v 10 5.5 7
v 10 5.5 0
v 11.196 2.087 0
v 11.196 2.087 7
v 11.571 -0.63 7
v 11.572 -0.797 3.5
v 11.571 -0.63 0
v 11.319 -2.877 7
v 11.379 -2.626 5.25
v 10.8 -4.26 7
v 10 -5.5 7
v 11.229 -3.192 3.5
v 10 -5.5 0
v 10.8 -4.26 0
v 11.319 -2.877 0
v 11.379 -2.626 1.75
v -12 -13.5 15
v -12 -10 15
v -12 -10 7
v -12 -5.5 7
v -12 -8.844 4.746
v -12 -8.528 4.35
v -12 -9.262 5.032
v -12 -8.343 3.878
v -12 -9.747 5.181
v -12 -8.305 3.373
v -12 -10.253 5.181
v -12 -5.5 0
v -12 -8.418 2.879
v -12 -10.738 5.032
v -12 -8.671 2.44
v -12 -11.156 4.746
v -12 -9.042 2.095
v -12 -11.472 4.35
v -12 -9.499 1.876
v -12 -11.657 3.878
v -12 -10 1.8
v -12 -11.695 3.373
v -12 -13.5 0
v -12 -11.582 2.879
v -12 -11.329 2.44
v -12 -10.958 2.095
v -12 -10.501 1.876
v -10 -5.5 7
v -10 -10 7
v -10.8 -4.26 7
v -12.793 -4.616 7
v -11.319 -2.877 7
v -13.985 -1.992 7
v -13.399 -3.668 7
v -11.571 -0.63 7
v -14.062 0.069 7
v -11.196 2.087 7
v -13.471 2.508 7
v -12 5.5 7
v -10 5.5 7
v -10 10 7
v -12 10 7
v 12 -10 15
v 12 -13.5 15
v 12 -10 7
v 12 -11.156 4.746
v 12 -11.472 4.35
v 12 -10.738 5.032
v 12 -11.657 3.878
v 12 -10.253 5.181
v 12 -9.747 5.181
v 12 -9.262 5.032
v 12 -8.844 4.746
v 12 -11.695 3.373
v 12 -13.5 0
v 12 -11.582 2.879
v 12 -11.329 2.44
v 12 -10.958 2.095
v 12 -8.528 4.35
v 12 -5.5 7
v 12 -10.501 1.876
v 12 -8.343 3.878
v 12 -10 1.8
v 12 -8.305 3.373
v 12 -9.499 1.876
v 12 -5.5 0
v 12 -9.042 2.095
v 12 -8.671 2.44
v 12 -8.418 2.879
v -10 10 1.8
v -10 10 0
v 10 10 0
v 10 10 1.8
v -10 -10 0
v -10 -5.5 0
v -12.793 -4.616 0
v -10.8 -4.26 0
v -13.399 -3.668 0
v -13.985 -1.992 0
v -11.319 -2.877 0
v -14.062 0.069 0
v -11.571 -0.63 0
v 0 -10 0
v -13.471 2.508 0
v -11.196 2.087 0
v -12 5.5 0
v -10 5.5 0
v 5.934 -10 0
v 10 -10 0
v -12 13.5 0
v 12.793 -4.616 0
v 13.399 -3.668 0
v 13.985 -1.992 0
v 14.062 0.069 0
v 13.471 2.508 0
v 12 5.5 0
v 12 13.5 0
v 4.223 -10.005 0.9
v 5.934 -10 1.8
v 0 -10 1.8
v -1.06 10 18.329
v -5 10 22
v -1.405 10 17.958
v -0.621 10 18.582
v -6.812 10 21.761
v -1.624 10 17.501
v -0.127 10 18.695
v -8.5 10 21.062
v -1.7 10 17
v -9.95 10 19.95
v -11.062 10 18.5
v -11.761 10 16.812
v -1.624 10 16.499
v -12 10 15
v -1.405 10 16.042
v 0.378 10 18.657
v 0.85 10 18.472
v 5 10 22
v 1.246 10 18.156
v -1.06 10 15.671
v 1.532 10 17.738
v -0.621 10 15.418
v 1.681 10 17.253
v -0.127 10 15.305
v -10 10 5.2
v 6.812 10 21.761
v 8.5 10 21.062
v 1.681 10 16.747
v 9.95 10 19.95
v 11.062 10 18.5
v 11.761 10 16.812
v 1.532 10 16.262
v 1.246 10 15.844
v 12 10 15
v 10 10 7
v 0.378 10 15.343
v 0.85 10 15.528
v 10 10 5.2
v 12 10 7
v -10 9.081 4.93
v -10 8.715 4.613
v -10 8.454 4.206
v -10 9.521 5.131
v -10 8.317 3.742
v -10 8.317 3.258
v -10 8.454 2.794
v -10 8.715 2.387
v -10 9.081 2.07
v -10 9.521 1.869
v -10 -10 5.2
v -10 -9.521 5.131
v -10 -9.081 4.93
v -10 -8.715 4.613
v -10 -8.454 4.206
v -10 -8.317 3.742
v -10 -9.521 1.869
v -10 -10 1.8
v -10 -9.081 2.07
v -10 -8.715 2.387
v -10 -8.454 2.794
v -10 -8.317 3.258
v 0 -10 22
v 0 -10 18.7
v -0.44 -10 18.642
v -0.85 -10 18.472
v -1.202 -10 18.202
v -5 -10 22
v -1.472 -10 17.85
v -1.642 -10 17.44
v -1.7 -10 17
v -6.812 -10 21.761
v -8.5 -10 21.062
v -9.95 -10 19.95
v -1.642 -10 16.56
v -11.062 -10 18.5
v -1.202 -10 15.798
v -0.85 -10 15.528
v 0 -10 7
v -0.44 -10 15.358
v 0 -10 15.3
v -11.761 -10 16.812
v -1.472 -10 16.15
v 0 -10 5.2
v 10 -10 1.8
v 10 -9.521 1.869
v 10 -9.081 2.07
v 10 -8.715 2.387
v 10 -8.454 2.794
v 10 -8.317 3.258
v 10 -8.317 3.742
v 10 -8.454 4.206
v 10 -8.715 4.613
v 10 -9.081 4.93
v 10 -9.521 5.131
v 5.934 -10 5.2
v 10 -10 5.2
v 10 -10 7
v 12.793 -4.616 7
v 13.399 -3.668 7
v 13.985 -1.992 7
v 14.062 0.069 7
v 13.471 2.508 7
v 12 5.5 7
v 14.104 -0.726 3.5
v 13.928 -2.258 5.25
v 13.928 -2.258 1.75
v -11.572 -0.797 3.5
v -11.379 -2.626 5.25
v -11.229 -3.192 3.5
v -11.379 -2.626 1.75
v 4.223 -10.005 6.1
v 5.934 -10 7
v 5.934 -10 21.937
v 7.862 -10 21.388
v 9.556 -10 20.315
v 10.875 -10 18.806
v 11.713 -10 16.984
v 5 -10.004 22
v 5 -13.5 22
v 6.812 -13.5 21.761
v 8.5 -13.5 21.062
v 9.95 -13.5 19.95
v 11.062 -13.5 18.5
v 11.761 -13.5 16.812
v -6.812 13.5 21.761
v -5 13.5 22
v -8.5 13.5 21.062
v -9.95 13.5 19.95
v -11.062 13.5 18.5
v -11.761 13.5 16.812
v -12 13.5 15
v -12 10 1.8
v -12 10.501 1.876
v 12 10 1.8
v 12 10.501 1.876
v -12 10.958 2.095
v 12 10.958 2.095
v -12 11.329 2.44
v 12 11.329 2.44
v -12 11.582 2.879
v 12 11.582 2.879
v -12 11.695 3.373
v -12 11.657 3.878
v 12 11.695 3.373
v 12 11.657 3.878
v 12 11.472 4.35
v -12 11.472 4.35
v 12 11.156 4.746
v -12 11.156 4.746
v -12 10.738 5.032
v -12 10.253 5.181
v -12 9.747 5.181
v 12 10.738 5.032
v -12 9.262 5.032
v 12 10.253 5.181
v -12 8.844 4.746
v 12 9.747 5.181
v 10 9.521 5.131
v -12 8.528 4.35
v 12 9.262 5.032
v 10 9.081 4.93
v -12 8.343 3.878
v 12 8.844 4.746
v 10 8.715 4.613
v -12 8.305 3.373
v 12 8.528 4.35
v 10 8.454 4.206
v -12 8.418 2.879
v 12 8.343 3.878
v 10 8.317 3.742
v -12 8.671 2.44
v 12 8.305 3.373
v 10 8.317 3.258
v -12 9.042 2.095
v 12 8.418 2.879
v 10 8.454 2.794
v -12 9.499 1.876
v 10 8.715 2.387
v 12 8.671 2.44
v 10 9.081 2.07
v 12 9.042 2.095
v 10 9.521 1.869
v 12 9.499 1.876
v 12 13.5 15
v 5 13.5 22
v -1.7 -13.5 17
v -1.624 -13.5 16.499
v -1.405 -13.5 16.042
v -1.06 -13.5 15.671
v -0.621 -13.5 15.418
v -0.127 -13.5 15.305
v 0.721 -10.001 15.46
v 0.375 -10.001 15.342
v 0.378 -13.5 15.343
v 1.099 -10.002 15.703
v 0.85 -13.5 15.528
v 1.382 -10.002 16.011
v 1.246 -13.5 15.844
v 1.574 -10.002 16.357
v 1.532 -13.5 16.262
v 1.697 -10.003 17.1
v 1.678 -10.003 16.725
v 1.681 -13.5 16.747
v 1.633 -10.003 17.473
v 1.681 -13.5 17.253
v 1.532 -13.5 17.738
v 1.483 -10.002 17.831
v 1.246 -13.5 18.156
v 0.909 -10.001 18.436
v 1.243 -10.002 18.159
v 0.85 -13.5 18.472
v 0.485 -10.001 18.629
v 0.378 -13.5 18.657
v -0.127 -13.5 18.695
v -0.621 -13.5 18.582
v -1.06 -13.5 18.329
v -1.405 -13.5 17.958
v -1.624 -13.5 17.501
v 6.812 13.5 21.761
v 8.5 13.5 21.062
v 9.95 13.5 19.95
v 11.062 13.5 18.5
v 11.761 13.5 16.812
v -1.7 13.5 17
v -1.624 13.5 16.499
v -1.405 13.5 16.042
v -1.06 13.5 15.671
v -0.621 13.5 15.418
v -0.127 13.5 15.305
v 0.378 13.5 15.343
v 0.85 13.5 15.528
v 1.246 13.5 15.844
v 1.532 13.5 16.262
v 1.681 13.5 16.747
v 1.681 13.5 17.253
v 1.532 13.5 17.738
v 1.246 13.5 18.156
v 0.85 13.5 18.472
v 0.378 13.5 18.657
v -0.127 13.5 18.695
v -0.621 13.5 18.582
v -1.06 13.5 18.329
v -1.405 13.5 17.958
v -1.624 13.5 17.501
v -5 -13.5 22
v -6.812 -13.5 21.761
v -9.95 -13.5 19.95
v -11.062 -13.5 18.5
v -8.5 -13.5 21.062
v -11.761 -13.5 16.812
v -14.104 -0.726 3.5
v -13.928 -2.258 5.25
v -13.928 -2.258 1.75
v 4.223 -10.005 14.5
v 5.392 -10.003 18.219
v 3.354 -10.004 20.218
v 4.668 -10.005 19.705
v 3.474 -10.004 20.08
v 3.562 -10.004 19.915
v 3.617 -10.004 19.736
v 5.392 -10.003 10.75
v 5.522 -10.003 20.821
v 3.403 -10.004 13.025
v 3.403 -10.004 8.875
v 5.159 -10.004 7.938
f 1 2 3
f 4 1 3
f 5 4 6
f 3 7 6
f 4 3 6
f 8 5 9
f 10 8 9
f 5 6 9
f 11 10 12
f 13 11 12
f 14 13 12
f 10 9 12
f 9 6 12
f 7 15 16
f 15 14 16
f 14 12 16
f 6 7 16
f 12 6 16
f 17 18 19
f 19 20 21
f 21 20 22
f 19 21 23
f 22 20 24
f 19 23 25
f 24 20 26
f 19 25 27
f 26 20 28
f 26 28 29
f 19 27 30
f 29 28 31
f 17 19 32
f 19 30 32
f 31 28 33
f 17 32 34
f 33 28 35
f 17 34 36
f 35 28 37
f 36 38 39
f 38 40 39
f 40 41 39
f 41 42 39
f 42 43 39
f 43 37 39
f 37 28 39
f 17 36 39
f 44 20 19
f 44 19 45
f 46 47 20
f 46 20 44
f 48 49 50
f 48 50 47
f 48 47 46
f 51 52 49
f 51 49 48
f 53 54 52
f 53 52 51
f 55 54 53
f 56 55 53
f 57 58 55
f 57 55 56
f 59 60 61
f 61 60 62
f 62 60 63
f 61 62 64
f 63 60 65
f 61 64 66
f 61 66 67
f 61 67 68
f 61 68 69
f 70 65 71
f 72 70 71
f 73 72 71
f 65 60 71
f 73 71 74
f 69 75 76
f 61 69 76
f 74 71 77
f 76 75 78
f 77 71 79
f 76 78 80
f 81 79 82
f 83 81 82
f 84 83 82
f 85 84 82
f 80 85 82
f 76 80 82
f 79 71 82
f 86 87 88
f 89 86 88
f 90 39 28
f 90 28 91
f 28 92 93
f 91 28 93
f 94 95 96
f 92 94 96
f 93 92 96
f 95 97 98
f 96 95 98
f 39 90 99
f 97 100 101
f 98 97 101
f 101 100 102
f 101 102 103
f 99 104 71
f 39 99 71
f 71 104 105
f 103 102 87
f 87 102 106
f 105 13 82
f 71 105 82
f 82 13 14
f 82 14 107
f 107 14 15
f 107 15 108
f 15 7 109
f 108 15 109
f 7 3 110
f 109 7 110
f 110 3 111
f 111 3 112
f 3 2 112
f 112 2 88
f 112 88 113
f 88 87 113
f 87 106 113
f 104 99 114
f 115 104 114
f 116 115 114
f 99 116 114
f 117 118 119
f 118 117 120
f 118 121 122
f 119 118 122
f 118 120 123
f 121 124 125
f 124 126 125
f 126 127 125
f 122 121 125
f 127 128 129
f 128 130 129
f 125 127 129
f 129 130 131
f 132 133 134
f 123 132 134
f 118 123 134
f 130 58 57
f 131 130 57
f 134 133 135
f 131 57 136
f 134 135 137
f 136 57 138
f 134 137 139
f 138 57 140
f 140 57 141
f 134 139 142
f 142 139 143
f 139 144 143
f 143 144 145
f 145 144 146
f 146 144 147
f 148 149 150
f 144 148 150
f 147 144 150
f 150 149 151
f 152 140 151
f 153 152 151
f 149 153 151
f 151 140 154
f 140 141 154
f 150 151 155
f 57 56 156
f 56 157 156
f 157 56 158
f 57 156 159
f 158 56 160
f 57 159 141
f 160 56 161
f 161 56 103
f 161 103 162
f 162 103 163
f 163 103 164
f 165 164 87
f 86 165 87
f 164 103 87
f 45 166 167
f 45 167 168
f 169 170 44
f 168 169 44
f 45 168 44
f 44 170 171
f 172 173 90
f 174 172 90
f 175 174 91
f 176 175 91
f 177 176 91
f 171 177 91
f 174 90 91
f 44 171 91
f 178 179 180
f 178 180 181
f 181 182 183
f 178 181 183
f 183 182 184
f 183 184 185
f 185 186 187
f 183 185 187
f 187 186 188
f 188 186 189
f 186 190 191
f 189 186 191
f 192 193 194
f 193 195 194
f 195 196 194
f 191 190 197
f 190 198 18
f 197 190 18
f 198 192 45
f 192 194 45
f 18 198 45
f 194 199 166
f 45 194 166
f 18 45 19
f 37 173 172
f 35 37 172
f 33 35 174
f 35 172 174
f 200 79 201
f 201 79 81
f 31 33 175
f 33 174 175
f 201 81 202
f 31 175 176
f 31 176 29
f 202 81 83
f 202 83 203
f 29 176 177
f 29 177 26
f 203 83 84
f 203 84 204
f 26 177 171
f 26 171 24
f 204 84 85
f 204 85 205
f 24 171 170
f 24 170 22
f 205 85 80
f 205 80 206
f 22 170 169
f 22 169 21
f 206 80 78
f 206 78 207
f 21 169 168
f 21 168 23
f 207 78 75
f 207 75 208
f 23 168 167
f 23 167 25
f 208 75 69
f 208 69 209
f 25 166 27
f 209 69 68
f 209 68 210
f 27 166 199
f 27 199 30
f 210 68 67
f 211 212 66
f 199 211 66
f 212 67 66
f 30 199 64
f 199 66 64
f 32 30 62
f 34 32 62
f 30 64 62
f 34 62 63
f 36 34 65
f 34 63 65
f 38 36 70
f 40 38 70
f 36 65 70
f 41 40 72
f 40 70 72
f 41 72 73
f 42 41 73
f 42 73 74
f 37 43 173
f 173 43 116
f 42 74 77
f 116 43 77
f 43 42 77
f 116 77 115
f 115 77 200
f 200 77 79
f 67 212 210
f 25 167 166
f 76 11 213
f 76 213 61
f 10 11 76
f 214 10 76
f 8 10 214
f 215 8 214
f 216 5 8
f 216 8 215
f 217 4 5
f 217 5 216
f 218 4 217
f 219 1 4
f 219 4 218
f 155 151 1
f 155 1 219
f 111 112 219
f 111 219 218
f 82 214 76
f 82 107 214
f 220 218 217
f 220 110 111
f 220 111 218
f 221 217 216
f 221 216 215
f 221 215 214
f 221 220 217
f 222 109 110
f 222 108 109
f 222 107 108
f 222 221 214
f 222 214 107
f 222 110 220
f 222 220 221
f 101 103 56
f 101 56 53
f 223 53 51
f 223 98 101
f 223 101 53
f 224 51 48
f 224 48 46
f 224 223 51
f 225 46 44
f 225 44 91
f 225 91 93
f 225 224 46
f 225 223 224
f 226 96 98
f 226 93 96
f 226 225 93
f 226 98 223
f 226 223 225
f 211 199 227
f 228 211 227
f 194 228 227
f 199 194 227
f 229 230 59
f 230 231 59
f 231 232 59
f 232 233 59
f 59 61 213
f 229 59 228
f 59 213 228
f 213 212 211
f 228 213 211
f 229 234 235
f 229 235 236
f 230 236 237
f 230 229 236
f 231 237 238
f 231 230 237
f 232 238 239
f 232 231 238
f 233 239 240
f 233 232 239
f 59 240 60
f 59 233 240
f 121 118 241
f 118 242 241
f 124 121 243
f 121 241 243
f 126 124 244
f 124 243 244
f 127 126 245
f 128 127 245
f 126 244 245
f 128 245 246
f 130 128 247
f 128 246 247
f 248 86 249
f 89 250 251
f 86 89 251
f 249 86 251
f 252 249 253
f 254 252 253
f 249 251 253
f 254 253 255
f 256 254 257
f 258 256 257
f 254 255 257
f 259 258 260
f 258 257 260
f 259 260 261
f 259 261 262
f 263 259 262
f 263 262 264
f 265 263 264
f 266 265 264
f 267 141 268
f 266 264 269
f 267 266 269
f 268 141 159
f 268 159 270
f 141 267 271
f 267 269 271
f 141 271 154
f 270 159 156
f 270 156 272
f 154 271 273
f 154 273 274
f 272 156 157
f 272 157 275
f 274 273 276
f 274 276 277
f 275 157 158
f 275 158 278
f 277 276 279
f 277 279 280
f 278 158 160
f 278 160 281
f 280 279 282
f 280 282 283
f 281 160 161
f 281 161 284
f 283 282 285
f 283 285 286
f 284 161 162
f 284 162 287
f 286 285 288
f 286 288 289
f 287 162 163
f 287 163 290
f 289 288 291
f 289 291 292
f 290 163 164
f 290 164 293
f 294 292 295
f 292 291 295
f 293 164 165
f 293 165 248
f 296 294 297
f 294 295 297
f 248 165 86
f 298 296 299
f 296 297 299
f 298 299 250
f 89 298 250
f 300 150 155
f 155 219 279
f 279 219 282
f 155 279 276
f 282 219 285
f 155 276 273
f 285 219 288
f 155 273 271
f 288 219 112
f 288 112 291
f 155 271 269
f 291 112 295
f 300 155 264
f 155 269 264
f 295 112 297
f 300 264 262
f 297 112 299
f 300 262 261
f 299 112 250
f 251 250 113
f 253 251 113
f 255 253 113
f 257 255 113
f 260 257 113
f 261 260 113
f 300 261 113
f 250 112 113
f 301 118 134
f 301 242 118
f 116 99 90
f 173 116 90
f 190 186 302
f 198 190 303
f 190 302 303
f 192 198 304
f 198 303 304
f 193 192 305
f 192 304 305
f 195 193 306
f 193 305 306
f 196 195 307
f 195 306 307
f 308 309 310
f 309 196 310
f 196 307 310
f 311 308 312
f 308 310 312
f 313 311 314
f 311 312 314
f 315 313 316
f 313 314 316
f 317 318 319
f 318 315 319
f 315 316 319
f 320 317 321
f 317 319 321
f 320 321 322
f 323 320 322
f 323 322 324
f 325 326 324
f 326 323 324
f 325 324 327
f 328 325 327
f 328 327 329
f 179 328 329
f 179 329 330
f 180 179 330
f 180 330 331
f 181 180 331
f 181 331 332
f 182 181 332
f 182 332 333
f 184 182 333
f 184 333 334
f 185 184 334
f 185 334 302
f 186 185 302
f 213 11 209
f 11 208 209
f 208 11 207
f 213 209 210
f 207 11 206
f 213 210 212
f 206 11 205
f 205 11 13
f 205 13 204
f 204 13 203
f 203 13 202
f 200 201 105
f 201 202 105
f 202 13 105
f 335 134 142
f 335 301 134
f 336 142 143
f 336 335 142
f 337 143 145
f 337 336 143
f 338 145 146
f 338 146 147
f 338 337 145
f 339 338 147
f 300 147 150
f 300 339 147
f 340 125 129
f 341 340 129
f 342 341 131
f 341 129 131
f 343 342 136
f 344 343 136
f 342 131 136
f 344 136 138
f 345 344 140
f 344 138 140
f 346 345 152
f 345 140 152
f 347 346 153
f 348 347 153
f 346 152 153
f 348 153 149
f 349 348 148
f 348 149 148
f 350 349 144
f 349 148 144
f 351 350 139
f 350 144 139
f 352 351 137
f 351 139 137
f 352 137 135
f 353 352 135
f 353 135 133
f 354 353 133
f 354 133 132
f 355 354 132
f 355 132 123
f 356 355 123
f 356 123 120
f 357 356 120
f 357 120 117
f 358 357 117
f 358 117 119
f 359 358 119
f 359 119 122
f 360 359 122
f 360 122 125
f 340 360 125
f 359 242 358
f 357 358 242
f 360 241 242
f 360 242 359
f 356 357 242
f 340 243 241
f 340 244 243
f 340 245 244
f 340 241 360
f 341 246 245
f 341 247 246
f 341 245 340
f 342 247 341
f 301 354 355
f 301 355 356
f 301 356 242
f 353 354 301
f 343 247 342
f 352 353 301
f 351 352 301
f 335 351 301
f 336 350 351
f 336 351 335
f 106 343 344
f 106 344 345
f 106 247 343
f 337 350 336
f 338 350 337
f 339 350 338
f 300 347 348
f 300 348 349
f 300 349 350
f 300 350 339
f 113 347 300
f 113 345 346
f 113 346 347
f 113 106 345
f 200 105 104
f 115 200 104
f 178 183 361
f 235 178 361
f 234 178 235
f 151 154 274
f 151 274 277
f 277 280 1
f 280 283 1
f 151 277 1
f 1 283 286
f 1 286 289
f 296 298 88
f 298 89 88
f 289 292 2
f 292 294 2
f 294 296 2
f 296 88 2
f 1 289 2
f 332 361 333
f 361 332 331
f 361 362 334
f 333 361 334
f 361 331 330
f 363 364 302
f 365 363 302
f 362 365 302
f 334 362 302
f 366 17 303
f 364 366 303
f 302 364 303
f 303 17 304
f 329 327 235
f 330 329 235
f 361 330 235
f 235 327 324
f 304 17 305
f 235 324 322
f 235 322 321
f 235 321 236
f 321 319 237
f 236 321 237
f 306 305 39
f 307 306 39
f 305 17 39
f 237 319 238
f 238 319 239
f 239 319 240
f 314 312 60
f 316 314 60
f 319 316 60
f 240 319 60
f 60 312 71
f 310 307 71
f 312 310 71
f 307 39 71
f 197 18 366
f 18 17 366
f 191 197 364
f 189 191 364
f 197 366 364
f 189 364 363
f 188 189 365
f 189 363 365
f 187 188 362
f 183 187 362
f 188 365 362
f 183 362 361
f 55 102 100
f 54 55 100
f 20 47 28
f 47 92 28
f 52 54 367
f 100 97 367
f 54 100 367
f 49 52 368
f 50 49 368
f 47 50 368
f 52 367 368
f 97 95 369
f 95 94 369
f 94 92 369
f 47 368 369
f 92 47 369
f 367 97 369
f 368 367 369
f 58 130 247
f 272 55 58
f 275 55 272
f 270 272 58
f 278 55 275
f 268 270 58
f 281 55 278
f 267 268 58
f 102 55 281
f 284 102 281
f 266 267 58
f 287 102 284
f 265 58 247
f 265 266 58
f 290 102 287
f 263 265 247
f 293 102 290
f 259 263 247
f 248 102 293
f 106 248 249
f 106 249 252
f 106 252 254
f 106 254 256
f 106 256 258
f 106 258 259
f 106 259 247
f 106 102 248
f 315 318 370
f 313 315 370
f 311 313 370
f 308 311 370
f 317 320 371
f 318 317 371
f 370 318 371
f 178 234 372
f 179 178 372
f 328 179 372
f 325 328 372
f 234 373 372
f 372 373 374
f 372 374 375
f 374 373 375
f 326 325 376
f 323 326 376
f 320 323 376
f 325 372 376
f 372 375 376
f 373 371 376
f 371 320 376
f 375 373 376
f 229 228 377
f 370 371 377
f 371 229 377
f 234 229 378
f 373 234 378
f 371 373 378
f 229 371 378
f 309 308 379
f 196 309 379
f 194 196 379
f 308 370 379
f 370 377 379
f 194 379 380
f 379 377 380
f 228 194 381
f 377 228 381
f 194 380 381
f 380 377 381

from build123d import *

# Parameters (mm, degrees)
SKETCH1_W               = 24
SKETCH1_H               = 3.5
BOSS_EXTRUDE1_DEPTH     = 7
BOSS_EXTRUDE2_START     = 7
BOSS_EXTRUDE2_OUTLINE_W = 24
BOSS_EXTRUDE2_OUTLINE_H = 3.5
BOSS_EXTRUDE2_DEPTH     = 15
FILLET1_R               = 7
M3_CLEARANCE_HOLE1_D    = 3.4
M3_CLEARANCE_HOLE2_D    = 3.4


# Read off the part's stored shape, not the designer's step: Boss-Extrude2
with BuildPart() as part:
    # Sketch1 → Boss-Extrude1 (new body)
    with BuildSketch(Plane.XY):
        with Locations((0, 11.75)):
            Rectangle(SKETCH1_W, SKETCH1_H)
        with BuildLine():
            Line((-10, 10), (-12, 10))
            Line((-12, 10), (-12, 5.5))
            add(Edge.make_bspline(
                [(-12, 5.5), (-16.208168435, -1.452739177), (-12, -5.5)],
                knots=[0, 0, 0, 0.703674115, 0.703674115, 0.703674115], degree=2))
            Line((-12, -5.5), (-12, -10))
            Line((-12, -10), (-10, -10))
            Line((-10, -10), (-10, -5.5))
            add(Edge.make_bspline(
                [(-10, 5.5), (-13.144989471, -1.593519523), (-10, -5.5)],
                knots=[0, 0, 0, 0.703674115, 0.703674115, 0.703674115], degree=2))
            Line((-10, 5.5), (-10, 10))
        make_face()
        with BuildLine():
            Line((12, 5.5), (12, 10))
            Line((12, 10), (10, 10))
            Line((10, 10), (10, 5.5))
            add(Edge.make_bspline(
                [(10, 5.5), (13.144989471, -1.593519523), (10, -5.5)],
                knots=[0, 0, 0, 0.703674115, 0.703674115, 0.703674115], degree=2))
            Line((10, -5.5), (10, -10))
            Line((10, -10), (12, -10))
            Line((12, -10), (12, -5.5))
            add(Edge.make_bspline(
                [(12, 5.5), (16.208168435, -1.452739177), (12, -5.5)],
                knots=[0, 0, 0, 0.703674115, 0.703674115, 0.703674115], degree=2))
        make_face()
        with BuildLine():
            Line((-10, -10), (-12, -10))
            Line((-12, -10), (-12, -13.5))
            Line((-12, -13.5), (12, -13.5))
            Line((12, -13.5), (12, -10))
            Line((12, -10), (10, -10))
            Line((10, -10), (5.934098246, -10))
            add(Edge.make_bspline(
                [(5.934098246, -10), (5.478588927, -10.00932896), (0, -10)],
                knots=[0.968742805, 0.968742805, 0.968742805, 1, 1, 1], degree=2))
            Line((0, -10), (-10, -10))
        make_face()
    extrude(amount=BOSS_EXTRUDE1_DEPTH)

    # Boss-Extrude2 outline → Boss-Extrude2 (add)
    with BuildSketch(Plane.XY.offset(BOSS_EXTRUDE2_START)):
        with BuildLine():
            Line((12, -10), (5.934098246, -10))
            add(Edge.make_bspline(
                [(5.934098246, -10), (5.478588927, -10.00932896), (0, -10)],
                knots=[0.968742805, 0.968742805, 0.968742805, 1, 1, 1], degree=2))
            Line((0, -10), (-12, -10))
            Line((-12, -10), (-12, -13.5))
            Line((-12, -13.5), (12, -13.5))
            Line((12, -13.5), (12, -10))
        make_face()
        with Locations((0, 11.75)):
            Rectangle(BOSS_EXTRUDE2_OUTLINE_W, BOSS_EXTRUDE2_OUTLINE_H)
    extrude(amount=BOSS_EXTRUDE2_DEPTH)

    # Fillet1
    fillet1_edges = [part.edges().sort_by_distance(p)[0] for p in [
        (12, -11.75, 22),
        (-12, -11.75, 22),
        (12, 11.75, 22),
        (-12, 11.75, 22),
    ]]
    fillet(fillet1_edges, radius=FILLET1_R)

    # M3 Clearance Hole1 (through all)
    with Locations(Plane.ZY.offset(12)):
        with Locations((3.5, 10), (3.5, -10)):
            Hole(M3_CLEARANCE_HOLE1_D / 2)

    # M3 Clearance Hole2 (through all)
    with Locations(Plane(origin=(0, 13.5, 0), x_dir=(1, 0, 0), z_dir=(0, 1, 0))):
        with Locations((0, -17)):
            Hole(M3_CLEARANCE_HOLE2_D / 2)


solid = part.part
